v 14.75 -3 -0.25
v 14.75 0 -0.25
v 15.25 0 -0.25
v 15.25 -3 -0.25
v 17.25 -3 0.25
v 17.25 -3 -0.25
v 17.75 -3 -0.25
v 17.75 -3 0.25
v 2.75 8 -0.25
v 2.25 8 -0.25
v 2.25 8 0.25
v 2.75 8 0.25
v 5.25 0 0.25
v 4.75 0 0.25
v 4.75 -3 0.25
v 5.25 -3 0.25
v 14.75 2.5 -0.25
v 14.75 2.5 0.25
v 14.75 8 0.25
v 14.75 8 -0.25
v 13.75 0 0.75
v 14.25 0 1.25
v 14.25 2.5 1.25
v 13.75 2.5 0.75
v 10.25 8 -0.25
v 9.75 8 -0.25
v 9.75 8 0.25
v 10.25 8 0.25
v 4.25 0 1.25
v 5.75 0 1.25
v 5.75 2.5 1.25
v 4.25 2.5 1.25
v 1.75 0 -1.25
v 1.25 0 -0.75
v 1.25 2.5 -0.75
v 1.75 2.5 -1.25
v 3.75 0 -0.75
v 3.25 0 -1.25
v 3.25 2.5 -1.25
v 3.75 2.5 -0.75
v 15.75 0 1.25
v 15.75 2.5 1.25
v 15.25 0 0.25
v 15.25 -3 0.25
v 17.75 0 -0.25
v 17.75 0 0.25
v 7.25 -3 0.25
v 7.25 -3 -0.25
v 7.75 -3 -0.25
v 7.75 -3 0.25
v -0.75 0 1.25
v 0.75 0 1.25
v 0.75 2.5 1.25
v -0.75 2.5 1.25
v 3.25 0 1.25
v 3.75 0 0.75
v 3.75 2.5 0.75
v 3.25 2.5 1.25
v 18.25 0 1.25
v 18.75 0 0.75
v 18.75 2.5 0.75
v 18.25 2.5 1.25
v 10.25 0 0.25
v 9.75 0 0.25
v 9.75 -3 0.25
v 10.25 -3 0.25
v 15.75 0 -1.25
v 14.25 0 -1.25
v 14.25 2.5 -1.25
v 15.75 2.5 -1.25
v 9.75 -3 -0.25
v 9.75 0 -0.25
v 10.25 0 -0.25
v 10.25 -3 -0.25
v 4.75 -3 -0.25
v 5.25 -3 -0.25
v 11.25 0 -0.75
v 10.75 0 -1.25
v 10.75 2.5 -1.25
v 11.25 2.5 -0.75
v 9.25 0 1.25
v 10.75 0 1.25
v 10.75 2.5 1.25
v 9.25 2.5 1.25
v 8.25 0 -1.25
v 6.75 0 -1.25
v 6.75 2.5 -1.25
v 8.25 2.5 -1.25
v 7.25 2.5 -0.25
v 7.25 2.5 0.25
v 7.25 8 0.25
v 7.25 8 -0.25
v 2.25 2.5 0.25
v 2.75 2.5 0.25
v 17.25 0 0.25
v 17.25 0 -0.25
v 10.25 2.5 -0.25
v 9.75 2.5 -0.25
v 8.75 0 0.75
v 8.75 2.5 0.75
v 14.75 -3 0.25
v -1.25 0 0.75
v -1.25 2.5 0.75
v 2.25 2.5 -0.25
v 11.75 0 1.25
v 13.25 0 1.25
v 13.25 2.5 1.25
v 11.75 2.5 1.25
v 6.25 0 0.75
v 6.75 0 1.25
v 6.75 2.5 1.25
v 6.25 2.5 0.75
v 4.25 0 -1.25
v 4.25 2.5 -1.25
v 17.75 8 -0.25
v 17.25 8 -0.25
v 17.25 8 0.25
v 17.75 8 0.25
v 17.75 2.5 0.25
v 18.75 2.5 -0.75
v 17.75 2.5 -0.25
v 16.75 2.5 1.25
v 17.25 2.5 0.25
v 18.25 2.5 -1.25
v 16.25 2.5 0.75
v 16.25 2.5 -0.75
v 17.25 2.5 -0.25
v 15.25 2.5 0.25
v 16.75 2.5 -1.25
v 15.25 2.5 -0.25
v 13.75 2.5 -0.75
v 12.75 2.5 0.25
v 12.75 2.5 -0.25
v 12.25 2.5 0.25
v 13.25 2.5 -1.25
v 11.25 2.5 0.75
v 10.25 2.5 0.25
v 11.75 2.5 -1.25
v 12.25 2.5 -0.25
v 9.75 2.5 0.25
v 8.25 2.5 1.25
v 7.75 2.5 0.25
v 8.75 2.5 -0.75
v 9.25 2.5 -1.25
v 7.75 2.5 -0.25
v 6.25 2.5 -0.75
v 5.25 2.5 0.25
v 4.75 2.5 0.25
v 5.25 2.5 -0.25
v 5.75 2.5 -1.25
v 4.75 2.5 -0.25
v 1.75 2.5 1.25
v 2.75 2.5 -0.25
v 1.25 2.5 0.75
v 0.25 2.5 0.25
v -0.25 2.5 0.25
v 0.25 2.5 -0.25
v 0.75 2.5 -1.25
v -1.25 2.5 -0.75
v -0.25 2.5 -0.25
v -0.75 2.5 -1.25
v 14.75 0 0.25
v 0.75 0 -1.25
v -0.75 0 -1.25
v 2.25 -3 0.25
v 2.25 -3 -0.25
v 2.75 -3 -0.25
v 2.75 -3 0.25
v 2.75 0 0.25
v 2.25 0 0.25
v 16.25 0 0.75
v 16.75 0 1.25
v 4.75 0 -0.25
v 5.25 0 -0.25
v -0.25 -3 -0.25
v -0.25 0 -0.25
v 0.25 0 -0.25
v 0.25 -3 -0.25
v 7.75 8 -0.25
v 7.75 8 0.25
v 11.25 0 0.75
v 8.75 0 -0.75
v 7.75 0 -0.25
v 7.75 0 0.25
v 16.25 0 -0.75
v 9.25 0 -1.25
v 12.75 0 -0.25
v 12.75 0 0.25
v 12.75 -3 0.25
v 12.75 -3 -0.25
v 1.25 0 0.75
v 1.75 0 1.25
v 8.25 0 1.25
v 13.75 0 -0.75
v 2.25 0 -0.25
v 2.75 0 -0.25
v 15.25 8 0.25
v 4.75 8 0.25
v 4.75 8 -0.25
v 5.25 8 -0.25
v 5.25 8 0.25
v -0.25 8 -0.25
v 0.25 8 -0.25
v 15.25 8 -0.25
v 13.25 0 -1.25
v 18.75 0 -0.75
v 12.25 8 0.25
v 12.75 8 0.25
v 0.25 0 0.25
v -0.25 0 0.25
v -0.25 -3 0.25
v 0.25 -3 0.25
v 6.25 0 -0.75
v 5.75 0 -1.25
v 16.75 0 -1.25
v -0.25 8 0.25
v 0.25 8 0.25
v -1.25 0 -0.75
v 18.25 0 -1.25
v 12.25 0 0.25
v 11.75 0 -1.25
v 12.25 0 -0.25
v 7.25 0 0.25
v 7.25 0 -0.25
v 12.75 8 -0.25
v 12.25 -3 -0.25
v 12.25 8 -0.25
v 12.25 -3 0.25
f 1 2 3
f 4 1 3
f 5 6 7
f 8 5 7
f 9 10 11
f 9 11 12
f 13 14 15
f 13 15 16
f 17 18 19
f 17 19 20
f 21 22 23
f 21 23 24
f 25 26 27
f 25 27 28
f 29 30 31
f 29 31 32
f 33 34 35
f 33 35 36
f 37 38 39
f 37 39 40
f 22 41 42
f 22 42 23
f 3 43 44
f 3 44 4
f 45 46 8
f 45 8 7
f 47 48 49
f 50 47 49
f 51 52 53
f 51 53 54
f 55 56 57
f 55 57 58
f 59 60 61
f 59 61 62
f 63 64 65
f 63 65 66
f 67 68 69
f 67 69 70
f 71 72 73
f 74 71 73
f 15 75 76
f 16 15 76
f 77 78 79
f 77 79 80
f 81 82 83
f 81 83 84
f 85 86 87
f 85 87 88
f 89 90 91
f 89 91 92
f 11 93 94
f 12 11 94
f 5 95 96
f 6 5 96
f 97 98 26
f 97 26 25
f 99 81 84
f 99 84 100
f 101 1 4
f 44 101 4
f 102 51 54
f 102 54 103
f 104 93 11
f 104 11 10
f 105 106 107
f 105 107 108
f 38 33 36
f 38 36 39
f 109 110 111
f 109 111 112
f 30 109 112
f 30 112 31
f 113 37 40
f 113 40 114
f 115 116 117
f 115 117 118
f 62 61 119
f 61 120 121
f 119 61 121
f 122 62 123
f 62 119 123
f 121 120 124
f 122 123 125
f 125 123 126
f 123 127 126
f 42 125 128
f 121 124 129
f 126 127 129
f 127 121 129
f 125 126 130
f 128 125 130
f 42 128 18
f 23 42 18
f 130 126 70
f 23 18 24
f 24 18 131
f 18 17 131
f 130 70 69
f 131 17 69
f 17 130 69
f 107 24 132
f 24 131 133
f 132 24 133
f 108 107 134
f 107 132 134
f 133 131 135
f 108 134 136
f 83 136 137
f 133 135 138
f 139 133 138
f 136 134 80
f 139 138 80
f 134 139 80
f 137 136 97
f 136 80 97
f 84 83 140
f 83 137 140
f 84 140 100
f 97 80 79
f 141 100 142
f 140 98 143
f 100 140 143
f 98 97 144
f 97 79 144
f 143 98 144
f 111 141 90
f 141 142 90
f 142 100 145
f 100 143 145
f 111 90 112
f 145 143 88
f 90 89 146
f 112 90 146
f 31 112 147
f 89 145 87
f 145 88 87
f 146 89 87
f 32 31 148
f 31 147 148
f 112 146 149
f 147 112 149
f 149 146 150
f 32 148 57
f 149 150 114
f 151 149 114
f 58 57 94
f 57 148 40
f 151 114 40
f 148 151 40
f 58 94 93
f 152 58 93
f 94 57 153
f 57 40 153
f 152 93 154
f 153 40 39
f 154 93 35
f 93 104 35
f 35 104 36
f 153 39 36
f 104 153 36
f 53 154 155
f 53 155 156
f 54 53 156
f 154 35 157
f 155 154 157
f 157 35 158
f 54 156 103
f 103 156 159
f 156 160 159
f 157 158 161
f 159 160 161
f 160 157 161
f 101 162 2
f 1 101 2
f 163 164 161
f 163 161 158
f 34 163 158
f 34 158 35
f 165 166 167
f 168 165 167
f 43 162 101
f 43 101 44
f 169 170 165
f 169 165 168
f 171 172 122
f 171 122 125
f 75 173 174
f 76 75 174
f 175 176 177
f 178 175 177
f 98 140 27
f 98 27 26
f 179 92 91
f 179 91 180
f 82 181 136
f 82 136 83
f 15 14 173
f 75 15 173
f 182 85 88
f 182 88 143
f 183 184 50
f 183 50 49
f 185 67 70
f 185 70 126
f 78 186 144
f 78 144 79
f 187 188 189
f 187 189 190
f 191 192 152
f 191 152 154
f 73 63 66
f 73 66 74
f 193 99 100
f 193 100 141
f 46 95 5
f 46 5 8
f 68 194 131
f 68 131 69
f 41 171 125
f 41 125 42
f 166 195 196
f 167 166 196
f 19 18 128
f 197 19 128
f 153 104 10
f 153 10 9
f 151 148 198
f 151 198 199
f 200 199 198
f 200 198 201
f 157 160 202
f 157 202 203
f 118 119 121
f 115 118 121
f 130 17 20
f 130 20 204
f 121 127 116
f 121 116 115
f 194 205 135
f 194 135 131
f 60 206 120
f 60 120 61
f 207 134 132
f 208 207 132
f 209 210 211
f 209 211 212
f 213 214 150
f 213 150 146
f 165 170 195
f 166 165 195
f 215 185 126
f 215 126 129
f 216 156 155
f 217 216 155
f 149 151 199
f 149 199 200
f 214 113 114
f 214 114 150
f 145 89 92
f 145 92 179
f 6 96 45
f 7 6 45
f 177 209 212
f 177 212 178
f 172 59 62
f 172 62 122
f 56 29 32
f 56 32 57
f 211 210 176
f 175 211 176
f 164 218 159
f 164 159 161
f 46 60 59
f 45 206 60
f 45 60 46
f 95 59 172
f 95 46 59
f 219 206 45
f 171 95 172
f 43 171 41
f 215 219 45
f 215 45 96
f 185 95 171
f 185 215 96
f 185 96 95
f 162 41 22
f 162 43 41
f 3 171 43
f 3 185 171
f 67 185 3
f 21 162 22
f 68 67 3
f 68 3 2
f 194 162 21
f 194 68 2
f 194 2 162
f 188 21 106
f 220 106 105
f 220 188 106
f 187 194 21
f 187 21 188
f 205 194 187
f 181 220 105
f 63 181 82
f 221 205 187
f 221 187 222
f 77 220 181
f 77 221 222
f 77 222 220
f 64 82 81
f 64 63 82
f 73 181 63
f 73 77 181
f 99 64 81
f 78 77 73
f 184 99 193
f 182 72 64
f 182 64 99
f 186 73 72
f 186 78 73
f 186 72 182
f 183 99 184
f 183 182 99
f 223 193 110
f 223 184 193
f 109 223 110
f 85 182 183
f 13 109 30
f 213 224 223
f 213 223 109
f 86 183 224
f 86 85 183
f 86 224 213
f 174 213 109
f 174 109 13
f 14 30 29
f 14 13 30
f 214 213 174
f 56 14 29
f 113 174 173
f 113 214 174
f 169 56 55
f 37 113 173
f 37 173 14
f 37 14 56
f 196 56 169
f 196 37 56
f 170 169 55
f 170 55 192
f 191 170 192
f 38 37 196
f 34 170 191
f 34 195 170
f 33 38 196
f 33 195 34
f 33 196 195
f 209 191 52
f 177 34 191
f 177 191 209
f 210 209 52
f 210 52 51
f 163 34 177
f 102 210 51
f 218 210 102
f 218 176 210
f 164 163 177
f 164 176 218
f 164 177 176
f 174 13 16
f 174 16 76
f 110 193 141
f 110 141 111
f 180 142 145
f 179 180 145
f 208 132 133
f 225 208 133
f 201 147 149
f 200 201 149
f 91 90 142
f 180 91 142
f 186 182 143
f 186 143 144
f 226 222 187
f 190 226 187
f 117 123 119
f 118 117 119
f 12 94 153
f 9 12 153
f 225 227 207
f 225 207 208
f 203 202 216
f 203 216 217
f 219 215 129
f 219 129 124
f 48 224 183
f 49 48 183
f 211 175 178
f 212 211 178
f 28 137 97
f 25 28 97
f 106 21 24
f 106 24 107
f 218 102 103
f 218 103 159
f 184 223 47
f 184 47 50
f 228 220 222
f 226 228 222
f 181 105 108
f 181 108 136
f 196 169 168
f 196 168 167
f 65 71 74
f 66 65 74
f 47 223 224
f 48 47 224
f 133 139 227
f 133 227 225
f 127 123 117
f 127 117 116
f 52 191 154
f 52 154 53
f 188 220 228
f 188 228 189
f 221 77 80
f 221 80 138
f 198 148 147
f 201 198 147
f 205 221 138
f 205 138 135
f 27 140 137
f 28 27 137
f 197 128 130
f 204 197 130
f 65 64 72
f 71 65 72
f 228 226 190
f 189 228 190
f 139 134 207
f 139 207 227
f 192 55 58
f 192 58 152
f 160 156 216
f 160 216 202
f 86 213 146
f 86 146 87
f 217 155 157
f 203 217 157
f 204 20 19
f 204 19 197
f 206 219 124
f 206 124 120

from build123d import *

# Parameters (mm, degrees)
BOSS_EXTRUDE1_DEPTH = 2.5
SKETCH2_W           = 0.5
SKETCH2_H           = 0.5
BOSS_EXTRUDE2_DEPTH = 5.5
SKETCH2_2_W         = 0.5
SKETCH2_2_H         = 0.5
BOSS_EXTRUDE3_DEPTH = 5.5


with BuildPart() as part:
    # Sketch1 → Boss-Extrude1 (new body)
    with BuildSketch(Plane(origin=(0, 0, 0), x_dir=(1, 0, 0), z_dir=(0, 1, 0))):
        Polygon((-1.25, 0.75), (-0.75, 1.25), (0.75, 1.25), (1.25, 0.75), (1.75, 1.25), (3.25, 1.25), (3.75, 0.75), (4.25, 1.25), (5.75, 1.25), (6.25, 0.75), (6.75, 1.25), (8.25, 1.25), (8.75, 0.75), (9.25, 1.25), (10.75, 1.25), (11.25, 0.75), (11.75, 1.25), (13.25, 1.25), (13.75, 0.75), (14.25, 1.25), (15.75, 1.25), (16.25, 0.75), (16.75, 1.25), (18.25, 1.25), (18.75, 0.75), (18.75, -0.75), (18.25, -1.25), (16.75, -1.25), (16.25, -0.75), (15.75, -1.25), (14.25, -1.25), (13.75, -0.75), (13.25, -1.25), (11.75, -1.25), (11.25, -0.75), (10.75, -1.25), (9.25, -1.25), (8.75, -0.75), (8.25, -1.25), (6.75, -1.25), (6.25, -0.75), (5.75, -1.25), (4.25, -1.25), (3.75, -0.75), (3.25, -1.25), (1.75, -1.25), (1.25, -0.75), (0.75, -1.25), (-0.75, -1.25), (-1.25, -0.75), align=None)
    extrude(amount=BOSS_EXTRUDE1_DEPTH)

    # Sketch2 → Boss-Extrude2 (add)
    with BuildSketch(Plane(origin=(0, 2.5, 0), x_dir=(1, 0, 0), z_dir=(0, 1, 0))):
        with Locations((2.5, 0)):
            Rectangle(SKETCH2_W, SKETCH2_H)
        Rectangle(SKETCH2_W, SKETCH2_H)
        with Locations((5, 0)):
            Rectangle(SKETCH2_W, SKETCH2_H)
        with Locations((7.5, 0)):
            Rectangle(SKETCH2_W, SKETCH2_H)
        with Locations((10, 0)):
            Rectangle(SKETCH2_W, SKETCH2_H)
        with Locations((12.5, 0)):
            Rectangle(SKETCH2_W, SKETCH2_H)
        with Locations((15, 0)):
            Rectangle(SKETCH2_W, SKETCH2_H)
        with Locations((17.5, 0)):
            Rectangle(SKETCH2_W, SKETCH2_H)
    extrude(amount=BOSS_EXTRUDE2_DEPTH)

    # Sketch2<2> → Boss-Extrude3 (add)
    with BuildSketch(Plane(origin=(0, 2.5, 0), x_dir=(1, 0, 0), z_dir=(0, 1, 0))):
        with Locations((2.5, 0)):
            Rectangle(SKETCH2_2_W, SKETCH2_2_H)
        Rectangle(SKETCH2_2_W, SKETCH2_2_H)
        with Locations((5, 0)):
            Rectangle(SKETCH2_2_W, SKETCH2_2_H)
        with Locations((7.5, 0)):
            Rectangle(SKETCH2_2_W, SKETCH2_2_H)
        with Locations((10, 0)):
            Rectangle(SKETCH2_2_W, SKETCH2_2_H)
        with Locations((12.5, 0)):
            Rectangle(SKETCH2_2_W, SKETCH2_2_H)
        with Locations((15, 0)):
            Rectangle(SKETCH2_2_W, SKETCH2_2_H)
        with Locations((17.5, 0)):
            Rectangle(SKETCH2_2_W, SKETCH2_2_H)
    extrude(amount=-BOSS_EXTRUDE3_DEPTH)


solid = part.part
